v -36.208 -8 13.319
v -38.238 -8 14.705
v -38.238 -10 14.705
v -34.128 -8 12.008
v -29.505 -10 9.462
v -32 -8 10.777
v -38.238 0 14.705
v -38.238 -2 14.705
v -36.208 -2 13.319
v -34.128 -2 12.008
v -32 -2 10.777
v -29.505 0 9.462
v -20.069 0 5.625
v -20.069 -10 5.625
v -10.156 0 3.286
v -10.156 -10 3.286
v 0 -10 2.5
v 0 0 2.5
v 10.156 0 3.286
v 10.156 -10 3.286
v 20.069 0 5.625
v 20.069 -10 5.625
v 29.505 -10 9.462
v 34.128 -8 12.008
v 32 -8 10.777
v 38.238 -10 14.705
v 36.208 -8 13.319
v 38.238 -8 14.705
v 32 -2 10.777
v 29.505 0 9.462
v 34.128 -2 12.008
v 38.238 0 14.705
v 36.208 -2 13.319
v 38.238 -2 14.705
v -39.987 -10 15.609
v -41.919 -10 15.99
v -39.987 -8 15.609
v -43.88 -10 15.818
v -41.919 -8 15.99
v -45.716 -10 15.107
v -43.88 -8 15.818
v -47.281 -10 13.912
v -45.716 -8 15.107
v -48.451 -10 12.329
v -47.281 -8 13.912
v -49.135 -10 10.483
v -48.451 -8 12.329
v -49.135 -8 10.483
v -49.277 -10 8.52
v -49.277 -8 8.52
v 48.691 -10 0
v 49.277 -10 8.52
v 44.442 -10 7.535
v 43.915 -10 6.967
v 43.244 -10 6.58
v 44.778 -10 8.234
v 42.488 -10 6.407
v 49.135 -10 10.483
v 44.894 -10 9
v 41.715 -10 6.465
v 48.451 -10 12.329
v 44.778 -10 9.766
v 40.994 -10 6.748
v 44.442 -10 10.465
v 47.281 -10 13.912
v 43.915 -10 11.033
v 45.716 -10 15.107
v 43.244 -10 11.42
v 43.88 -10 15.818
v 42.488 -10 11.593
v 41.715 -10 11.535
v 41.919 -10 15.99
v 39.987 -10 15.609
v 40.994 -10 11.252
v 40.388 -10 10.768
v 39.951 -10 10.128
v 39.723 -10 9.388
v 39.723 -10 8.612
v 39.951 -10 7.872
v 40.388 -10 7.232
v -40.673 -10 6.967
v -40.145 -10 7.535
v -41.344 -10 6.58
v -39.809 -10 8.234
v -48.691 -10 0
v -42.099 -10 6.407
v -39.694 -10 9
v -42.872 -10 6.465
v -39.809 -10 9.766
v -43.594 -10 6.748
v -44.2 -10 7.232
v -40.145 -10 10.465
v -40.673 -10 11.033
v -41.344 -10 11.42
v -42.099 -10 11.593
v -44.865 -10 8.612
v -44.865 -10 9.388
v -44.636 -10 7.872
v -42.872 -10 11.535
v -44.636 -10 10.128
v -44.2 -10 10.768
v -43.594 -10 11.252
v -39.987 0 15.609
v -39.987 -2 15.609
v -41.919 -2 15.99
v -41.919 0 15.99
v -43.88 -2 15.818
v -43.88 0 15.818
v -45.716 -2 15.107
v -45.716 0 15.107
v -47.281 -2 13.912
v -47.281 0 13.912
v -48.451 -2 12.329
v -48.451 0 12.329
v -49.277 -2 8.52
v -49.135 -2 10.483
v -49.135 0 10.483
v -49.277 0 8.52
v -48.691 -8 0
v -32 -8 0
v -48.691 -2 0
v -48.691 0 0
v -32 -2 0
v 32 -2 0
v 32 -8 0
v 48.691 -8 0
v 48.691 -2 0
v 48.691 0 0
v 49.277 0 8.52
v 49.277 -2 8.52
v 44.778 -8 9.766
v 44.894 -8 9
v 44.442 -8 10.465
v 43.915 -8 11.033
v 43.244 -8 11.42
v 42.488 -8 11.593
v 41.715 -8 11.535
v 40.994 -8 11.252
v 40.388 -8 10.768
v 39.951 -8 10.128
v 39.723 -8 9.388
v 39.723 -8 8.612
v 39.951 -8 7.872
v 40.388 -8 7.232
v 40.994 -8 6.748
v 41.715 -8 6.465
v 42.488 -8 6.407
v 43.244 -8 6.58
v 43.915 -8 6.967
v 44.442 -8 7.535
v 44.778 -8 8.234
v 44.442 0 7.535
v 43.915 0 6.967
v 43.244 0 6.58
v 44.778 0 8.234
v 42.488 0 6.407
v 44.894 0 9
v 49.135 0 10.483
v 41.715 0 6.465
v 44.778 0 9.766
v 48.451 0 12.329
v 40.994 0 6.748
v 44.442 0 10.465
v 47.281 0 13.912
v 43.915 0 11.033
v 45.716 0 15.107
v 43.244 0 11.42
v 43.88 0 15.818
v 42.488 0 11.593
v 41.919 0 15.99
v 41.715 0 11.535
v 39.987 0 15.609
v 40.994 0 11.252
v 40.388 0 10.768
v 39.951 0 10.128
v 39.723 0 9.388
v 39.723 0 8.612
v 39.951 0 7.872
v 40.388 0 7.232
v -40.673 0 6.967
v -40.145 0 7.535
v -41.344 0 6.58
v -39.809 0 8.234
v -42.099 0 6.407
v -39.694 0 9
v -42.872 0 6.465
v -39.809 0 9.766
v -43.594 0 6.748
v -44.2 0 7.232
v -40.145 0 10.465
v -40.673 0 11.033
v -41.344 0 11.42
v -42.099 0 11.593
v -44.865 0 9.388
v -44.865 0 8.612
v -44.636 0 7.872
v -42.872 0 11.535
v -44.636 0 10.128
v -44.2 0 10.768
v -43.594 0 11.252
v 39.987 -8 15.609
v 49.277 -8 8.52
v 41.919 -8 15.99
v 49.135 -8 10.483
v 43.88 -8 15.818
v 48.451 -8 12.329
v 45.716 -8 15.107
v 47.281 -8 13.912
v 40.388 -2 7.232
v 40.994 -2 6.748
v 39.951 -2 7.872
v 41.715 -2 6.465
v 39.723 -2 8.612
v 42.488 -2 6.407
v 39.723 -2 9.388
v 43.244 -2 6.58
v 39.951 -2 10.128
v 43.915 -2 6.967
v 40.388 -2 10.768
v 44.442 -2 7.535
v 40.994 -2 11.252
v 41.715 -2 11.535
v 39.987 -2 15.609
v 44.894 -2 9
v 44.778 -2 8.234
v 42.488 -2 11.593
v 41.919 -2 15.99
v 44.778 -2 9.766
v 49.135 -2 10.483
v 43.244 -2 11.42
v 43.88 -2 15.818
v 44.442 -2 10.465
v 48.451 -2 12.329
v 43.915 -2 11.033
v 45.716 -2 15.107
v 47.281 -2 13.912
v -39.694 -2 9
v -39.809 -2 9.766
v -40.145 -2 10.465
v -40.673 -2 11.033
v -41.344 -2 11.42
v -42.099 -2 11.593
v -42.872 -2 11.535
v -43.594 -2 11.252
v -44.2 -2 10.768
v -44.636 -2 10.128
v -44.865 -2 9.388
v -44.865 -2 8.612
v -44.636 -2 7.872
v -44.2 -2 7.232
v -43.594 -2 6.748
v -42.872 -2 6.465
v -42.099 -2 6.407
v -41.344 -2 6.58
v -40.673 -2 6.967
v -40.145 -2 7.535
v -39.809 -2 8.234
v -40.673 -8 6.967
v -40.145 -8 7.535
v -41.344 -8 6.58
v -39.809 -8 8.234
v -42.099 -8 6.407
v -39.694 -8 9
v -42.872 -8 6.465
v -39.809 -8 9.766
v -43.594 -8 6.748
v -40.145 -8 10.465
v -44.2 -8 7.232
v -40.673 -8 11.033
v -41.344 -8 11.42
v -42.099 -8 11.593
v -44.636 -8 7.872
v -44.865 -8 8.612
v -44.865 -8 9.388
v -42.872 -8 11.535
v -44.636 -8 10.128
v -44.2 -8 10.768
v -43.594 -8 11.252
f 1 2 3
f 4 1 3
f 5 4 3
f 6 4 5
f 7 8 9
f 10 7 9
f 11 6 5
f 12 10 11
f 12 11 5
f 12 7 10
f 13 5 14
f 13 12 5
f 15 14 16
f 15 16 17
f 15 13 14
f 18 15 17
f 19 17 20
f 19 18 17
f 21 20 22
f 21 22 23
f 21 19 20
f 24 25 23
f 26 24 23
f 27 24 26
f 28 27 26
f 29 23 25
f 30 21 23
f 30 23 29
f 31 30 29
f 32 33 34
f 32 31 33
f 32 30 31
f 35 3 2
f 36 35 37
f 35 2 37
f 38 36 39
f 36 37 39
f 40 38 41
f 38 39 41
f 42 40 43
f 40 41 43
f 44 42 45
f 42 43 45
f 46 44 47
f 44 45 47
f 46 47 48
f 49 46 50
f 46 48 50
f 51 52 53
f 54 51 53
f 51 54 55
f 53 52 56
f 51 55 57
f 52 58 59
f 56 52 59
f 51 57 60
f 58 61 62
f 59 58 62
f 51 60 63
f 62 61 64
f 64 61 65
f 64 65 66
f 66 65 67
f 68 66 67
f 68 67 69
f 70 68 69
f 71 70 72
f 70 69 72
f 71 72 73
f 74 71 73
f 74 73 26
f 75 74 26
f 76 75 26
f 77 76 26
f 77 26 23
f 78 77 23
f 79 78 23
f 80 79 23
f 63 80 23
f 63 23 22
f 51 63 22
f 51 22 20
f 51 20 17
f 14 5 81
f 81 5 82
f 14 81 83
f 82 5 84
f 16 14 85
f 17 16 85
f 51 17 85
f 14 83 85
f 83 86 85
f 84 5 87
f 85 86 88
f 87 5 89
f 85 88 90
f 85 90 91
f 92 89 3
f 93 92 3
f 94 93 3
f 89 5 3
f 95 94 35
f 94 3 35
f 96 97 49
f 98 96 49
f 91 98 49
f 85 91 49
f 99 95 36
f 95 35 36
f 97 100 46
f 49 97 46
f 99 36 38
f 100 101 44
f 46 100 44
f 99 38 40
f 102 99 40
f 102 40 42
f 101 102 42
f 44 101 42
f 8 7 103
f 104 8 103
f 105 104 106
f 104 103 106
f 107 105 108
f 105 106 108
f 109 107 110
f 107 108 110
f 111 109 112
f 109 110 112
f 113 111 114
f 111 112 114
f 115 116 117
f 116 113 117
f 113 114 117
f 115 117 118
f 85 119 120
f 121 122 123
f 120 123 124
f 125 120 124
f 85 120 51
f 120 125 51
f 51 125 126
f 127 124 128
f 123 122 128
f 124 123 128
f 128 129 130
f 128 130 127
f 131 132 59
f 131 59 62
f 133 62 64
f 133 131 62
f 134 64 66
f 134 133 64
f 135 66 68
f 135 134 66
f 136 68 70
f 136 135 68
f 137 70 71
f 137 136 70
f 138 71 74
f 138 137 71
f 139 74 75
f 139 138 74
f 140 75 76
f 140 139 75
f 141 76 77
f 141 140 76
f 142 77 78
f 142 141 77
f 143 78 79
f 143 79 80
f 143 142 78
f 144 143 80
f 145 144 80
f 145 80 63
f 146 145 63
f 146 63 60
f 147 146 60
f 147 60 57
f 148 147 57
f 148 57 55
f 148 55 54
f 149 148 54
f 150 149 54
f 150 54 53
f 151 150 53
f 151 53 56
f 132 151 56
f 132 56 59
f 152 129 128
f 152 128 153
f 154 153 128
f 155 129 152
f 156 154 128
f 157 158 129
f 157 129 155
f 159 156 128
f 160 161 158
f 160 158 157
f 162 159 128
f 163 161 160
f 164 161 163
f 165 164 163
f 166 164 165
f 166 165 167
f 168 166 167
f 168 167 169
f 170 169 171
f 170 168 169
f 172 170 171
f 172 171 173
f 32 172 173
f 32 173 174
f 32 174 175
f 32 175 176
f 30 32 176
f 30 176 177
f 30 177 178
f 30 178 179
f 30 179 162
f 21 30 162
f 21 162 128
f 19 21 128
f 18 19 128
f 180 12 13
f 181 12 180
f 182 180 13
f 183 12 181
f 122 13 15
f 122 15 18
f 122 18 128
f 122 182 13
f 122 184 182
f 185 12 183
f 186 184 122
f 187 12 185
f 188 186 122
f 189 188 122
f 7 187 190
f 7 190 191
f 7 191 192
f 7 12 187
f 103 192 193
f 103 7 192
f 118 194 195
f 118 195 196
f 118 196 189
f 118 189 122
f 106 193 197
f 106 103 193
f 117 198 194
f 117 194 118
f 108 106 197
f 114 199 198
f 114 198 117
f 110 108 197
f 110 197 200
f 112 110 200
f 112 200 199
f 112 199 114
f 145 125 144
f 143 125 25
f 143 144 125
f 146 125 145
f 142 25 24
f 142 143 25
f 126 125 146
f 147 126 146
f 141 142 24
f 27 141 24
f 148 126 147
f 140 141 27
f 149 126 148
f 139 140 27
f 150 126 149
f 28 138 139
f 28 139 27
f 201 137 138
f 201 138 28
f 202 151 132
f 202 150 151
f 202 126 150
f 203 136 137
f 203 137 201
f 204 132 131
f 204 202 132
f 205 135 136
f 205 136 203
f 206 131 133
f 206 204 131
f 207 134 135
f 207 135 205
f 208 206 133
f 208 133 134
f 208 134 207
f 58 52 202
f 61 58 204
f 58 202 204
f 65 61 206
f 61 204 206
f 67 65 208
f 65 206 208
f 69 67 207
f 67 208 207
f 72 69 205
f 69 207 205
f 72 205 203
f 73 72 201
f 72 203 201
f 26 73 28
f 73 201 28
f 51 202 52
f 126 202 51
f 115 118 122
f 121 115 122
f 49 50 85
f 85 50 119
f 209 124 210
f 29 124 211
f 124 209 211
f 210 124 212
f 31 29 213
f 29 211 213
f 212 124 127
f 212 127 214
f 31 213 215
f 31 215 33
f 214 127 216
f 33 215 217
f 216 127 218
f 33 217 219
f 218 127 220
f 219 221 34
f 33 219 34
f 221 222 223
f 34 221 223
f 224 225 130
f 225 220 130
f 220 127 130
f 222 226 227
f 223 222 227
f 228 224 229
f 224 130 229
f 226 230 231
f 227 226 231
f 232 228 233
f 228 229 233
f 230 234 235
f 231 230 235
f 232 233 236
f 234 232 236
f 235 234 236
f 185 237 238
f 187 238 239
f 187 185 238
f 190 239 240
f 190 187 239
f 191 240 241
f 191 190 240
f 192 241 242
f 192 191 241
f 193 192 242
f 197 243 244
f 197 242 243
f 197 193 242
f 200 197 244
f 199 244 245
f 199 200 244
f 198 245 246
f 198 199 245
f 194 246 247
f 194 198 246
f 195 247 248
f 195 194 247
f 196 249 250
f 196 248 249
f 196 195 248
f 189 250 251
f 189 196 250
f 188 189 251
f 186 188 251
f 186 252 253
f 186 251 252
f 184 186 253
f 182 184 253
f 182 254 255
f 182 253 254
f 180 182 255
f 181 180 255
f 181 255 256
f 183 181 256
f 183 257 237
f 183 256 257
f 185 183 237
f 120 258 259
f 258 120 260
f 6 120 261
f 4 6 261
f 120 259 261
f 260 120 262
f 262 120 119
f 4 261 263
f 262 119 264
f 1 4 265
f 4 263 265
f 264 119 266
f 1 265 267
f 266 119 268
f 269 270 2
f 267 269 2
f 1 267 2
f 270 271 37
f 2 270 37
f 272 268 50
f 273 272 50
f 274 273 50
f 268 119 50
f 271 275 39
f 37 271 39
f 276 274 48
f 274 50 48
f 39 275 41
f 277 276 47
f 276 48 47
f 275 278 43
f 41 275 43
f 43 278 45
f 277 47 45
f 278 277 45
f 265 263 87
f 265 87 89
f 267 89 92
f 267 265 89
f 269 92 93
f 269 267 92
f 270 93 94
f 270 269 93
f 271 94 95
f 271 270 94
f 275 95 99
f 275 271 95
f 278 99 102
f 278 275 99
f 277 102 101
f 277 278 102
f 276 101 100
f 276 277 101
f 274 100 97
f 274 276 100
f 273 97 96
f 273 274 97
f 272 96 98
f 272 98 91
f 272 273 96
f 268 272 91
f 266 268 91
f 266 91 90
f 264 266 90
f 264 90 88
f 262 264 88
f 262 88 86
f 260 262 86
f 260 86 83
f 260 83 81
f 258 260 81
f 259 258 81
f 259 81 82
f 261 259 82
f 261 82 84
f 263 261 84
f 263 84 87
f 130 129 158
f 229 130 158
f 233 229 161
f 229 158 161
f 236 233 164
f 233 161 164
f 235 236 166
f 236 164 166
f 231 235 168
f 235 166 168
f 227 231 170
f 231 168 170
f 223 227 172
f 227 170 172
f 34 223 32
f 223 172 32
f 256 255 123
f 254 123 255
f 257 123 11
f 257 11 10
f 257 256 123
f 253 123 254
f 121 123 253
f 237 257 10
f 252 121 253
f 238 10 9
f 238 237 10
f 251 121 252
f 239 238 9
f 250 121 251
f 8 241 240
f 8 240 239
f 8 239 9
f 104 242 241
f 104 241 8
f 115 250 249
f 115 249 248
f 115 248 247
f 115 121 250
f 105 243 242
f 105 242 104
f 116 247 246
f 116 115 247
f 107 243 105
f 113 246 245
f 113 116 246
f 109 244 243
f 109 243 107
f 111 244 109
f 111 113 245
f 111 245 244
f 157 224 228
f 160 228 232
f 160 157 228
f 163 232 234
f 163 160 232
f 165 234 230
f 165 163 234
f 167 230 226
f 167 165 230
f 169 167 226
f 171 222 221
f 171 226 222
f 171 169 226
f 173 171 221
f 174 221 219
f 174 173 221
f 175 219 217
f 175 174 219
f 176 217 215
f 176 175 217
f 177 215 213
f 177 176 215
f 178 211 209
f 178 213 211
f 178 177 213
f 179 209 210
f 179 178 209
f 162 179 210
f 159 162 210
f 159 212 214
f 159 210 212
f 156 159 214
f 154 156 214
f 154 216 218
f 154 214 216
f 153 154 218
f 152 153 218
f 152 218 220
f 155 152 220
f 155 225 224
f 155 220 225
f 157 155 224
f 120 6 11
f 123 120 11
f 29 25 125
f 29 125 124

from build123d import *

# Parameters (mm, degrees)
SKETCH_R     = 2.6
PAD_DEPTH    = 10
SKETCH002_W  = 6
SKETCH002_H  = 19.473974
POCKET_DEPTH = 18


with BuildPart() as part:
    # Sketch → Pad (new body)
    with BuildSketch(Plane.XZ):
        with BuildLine():
            ThreePointArc((-38.238064, 14.705479), (0, 2.5), (38.238064, 14.705479))
            ThreePointArc((49.277108, 8.519541), (45.715556, 15.106581), (38.238064, 14.705479))
            Line((49.277108, 8.519541), (48.69097, 0))
            Line((-48.69097, 0), (48.69097, 0))
            Line((-49.277108, 8.519541), (-48.69097, 0))
            ThreePointArc((-38.238064, 14.705479), (-45.715556, 15.106581), (-49.277108, 8.519541))
        make_face()
        with Locations((-42.293617, 9)):
            Circle(SKETCH_R, mode=Mode.SUBTRACT)
        with Locations((42.293617, 9)):
            Circle(SKETCH_R, mode=Mode.SUBTRACT)
    extrude(amount=PAD_DEPTH)

    # Sketch002 (on DatumPlane) → Pocket (cut)
    with BuildSketch(Plane.YZ.offset(50)):
        with Locations((-5, 8.823125)):
            Rectangle(SKETCH002_W, SKETCH002_H)
    pocket = extrude(amount=-POCKET_DEPTH, mode=Mode.SUBTRACT)

    # Mirrored: Pocket across YZ
    add(pocket.mirror(Plane.YZ), mode=Mode.SUBTRACT)


solid = part.part
